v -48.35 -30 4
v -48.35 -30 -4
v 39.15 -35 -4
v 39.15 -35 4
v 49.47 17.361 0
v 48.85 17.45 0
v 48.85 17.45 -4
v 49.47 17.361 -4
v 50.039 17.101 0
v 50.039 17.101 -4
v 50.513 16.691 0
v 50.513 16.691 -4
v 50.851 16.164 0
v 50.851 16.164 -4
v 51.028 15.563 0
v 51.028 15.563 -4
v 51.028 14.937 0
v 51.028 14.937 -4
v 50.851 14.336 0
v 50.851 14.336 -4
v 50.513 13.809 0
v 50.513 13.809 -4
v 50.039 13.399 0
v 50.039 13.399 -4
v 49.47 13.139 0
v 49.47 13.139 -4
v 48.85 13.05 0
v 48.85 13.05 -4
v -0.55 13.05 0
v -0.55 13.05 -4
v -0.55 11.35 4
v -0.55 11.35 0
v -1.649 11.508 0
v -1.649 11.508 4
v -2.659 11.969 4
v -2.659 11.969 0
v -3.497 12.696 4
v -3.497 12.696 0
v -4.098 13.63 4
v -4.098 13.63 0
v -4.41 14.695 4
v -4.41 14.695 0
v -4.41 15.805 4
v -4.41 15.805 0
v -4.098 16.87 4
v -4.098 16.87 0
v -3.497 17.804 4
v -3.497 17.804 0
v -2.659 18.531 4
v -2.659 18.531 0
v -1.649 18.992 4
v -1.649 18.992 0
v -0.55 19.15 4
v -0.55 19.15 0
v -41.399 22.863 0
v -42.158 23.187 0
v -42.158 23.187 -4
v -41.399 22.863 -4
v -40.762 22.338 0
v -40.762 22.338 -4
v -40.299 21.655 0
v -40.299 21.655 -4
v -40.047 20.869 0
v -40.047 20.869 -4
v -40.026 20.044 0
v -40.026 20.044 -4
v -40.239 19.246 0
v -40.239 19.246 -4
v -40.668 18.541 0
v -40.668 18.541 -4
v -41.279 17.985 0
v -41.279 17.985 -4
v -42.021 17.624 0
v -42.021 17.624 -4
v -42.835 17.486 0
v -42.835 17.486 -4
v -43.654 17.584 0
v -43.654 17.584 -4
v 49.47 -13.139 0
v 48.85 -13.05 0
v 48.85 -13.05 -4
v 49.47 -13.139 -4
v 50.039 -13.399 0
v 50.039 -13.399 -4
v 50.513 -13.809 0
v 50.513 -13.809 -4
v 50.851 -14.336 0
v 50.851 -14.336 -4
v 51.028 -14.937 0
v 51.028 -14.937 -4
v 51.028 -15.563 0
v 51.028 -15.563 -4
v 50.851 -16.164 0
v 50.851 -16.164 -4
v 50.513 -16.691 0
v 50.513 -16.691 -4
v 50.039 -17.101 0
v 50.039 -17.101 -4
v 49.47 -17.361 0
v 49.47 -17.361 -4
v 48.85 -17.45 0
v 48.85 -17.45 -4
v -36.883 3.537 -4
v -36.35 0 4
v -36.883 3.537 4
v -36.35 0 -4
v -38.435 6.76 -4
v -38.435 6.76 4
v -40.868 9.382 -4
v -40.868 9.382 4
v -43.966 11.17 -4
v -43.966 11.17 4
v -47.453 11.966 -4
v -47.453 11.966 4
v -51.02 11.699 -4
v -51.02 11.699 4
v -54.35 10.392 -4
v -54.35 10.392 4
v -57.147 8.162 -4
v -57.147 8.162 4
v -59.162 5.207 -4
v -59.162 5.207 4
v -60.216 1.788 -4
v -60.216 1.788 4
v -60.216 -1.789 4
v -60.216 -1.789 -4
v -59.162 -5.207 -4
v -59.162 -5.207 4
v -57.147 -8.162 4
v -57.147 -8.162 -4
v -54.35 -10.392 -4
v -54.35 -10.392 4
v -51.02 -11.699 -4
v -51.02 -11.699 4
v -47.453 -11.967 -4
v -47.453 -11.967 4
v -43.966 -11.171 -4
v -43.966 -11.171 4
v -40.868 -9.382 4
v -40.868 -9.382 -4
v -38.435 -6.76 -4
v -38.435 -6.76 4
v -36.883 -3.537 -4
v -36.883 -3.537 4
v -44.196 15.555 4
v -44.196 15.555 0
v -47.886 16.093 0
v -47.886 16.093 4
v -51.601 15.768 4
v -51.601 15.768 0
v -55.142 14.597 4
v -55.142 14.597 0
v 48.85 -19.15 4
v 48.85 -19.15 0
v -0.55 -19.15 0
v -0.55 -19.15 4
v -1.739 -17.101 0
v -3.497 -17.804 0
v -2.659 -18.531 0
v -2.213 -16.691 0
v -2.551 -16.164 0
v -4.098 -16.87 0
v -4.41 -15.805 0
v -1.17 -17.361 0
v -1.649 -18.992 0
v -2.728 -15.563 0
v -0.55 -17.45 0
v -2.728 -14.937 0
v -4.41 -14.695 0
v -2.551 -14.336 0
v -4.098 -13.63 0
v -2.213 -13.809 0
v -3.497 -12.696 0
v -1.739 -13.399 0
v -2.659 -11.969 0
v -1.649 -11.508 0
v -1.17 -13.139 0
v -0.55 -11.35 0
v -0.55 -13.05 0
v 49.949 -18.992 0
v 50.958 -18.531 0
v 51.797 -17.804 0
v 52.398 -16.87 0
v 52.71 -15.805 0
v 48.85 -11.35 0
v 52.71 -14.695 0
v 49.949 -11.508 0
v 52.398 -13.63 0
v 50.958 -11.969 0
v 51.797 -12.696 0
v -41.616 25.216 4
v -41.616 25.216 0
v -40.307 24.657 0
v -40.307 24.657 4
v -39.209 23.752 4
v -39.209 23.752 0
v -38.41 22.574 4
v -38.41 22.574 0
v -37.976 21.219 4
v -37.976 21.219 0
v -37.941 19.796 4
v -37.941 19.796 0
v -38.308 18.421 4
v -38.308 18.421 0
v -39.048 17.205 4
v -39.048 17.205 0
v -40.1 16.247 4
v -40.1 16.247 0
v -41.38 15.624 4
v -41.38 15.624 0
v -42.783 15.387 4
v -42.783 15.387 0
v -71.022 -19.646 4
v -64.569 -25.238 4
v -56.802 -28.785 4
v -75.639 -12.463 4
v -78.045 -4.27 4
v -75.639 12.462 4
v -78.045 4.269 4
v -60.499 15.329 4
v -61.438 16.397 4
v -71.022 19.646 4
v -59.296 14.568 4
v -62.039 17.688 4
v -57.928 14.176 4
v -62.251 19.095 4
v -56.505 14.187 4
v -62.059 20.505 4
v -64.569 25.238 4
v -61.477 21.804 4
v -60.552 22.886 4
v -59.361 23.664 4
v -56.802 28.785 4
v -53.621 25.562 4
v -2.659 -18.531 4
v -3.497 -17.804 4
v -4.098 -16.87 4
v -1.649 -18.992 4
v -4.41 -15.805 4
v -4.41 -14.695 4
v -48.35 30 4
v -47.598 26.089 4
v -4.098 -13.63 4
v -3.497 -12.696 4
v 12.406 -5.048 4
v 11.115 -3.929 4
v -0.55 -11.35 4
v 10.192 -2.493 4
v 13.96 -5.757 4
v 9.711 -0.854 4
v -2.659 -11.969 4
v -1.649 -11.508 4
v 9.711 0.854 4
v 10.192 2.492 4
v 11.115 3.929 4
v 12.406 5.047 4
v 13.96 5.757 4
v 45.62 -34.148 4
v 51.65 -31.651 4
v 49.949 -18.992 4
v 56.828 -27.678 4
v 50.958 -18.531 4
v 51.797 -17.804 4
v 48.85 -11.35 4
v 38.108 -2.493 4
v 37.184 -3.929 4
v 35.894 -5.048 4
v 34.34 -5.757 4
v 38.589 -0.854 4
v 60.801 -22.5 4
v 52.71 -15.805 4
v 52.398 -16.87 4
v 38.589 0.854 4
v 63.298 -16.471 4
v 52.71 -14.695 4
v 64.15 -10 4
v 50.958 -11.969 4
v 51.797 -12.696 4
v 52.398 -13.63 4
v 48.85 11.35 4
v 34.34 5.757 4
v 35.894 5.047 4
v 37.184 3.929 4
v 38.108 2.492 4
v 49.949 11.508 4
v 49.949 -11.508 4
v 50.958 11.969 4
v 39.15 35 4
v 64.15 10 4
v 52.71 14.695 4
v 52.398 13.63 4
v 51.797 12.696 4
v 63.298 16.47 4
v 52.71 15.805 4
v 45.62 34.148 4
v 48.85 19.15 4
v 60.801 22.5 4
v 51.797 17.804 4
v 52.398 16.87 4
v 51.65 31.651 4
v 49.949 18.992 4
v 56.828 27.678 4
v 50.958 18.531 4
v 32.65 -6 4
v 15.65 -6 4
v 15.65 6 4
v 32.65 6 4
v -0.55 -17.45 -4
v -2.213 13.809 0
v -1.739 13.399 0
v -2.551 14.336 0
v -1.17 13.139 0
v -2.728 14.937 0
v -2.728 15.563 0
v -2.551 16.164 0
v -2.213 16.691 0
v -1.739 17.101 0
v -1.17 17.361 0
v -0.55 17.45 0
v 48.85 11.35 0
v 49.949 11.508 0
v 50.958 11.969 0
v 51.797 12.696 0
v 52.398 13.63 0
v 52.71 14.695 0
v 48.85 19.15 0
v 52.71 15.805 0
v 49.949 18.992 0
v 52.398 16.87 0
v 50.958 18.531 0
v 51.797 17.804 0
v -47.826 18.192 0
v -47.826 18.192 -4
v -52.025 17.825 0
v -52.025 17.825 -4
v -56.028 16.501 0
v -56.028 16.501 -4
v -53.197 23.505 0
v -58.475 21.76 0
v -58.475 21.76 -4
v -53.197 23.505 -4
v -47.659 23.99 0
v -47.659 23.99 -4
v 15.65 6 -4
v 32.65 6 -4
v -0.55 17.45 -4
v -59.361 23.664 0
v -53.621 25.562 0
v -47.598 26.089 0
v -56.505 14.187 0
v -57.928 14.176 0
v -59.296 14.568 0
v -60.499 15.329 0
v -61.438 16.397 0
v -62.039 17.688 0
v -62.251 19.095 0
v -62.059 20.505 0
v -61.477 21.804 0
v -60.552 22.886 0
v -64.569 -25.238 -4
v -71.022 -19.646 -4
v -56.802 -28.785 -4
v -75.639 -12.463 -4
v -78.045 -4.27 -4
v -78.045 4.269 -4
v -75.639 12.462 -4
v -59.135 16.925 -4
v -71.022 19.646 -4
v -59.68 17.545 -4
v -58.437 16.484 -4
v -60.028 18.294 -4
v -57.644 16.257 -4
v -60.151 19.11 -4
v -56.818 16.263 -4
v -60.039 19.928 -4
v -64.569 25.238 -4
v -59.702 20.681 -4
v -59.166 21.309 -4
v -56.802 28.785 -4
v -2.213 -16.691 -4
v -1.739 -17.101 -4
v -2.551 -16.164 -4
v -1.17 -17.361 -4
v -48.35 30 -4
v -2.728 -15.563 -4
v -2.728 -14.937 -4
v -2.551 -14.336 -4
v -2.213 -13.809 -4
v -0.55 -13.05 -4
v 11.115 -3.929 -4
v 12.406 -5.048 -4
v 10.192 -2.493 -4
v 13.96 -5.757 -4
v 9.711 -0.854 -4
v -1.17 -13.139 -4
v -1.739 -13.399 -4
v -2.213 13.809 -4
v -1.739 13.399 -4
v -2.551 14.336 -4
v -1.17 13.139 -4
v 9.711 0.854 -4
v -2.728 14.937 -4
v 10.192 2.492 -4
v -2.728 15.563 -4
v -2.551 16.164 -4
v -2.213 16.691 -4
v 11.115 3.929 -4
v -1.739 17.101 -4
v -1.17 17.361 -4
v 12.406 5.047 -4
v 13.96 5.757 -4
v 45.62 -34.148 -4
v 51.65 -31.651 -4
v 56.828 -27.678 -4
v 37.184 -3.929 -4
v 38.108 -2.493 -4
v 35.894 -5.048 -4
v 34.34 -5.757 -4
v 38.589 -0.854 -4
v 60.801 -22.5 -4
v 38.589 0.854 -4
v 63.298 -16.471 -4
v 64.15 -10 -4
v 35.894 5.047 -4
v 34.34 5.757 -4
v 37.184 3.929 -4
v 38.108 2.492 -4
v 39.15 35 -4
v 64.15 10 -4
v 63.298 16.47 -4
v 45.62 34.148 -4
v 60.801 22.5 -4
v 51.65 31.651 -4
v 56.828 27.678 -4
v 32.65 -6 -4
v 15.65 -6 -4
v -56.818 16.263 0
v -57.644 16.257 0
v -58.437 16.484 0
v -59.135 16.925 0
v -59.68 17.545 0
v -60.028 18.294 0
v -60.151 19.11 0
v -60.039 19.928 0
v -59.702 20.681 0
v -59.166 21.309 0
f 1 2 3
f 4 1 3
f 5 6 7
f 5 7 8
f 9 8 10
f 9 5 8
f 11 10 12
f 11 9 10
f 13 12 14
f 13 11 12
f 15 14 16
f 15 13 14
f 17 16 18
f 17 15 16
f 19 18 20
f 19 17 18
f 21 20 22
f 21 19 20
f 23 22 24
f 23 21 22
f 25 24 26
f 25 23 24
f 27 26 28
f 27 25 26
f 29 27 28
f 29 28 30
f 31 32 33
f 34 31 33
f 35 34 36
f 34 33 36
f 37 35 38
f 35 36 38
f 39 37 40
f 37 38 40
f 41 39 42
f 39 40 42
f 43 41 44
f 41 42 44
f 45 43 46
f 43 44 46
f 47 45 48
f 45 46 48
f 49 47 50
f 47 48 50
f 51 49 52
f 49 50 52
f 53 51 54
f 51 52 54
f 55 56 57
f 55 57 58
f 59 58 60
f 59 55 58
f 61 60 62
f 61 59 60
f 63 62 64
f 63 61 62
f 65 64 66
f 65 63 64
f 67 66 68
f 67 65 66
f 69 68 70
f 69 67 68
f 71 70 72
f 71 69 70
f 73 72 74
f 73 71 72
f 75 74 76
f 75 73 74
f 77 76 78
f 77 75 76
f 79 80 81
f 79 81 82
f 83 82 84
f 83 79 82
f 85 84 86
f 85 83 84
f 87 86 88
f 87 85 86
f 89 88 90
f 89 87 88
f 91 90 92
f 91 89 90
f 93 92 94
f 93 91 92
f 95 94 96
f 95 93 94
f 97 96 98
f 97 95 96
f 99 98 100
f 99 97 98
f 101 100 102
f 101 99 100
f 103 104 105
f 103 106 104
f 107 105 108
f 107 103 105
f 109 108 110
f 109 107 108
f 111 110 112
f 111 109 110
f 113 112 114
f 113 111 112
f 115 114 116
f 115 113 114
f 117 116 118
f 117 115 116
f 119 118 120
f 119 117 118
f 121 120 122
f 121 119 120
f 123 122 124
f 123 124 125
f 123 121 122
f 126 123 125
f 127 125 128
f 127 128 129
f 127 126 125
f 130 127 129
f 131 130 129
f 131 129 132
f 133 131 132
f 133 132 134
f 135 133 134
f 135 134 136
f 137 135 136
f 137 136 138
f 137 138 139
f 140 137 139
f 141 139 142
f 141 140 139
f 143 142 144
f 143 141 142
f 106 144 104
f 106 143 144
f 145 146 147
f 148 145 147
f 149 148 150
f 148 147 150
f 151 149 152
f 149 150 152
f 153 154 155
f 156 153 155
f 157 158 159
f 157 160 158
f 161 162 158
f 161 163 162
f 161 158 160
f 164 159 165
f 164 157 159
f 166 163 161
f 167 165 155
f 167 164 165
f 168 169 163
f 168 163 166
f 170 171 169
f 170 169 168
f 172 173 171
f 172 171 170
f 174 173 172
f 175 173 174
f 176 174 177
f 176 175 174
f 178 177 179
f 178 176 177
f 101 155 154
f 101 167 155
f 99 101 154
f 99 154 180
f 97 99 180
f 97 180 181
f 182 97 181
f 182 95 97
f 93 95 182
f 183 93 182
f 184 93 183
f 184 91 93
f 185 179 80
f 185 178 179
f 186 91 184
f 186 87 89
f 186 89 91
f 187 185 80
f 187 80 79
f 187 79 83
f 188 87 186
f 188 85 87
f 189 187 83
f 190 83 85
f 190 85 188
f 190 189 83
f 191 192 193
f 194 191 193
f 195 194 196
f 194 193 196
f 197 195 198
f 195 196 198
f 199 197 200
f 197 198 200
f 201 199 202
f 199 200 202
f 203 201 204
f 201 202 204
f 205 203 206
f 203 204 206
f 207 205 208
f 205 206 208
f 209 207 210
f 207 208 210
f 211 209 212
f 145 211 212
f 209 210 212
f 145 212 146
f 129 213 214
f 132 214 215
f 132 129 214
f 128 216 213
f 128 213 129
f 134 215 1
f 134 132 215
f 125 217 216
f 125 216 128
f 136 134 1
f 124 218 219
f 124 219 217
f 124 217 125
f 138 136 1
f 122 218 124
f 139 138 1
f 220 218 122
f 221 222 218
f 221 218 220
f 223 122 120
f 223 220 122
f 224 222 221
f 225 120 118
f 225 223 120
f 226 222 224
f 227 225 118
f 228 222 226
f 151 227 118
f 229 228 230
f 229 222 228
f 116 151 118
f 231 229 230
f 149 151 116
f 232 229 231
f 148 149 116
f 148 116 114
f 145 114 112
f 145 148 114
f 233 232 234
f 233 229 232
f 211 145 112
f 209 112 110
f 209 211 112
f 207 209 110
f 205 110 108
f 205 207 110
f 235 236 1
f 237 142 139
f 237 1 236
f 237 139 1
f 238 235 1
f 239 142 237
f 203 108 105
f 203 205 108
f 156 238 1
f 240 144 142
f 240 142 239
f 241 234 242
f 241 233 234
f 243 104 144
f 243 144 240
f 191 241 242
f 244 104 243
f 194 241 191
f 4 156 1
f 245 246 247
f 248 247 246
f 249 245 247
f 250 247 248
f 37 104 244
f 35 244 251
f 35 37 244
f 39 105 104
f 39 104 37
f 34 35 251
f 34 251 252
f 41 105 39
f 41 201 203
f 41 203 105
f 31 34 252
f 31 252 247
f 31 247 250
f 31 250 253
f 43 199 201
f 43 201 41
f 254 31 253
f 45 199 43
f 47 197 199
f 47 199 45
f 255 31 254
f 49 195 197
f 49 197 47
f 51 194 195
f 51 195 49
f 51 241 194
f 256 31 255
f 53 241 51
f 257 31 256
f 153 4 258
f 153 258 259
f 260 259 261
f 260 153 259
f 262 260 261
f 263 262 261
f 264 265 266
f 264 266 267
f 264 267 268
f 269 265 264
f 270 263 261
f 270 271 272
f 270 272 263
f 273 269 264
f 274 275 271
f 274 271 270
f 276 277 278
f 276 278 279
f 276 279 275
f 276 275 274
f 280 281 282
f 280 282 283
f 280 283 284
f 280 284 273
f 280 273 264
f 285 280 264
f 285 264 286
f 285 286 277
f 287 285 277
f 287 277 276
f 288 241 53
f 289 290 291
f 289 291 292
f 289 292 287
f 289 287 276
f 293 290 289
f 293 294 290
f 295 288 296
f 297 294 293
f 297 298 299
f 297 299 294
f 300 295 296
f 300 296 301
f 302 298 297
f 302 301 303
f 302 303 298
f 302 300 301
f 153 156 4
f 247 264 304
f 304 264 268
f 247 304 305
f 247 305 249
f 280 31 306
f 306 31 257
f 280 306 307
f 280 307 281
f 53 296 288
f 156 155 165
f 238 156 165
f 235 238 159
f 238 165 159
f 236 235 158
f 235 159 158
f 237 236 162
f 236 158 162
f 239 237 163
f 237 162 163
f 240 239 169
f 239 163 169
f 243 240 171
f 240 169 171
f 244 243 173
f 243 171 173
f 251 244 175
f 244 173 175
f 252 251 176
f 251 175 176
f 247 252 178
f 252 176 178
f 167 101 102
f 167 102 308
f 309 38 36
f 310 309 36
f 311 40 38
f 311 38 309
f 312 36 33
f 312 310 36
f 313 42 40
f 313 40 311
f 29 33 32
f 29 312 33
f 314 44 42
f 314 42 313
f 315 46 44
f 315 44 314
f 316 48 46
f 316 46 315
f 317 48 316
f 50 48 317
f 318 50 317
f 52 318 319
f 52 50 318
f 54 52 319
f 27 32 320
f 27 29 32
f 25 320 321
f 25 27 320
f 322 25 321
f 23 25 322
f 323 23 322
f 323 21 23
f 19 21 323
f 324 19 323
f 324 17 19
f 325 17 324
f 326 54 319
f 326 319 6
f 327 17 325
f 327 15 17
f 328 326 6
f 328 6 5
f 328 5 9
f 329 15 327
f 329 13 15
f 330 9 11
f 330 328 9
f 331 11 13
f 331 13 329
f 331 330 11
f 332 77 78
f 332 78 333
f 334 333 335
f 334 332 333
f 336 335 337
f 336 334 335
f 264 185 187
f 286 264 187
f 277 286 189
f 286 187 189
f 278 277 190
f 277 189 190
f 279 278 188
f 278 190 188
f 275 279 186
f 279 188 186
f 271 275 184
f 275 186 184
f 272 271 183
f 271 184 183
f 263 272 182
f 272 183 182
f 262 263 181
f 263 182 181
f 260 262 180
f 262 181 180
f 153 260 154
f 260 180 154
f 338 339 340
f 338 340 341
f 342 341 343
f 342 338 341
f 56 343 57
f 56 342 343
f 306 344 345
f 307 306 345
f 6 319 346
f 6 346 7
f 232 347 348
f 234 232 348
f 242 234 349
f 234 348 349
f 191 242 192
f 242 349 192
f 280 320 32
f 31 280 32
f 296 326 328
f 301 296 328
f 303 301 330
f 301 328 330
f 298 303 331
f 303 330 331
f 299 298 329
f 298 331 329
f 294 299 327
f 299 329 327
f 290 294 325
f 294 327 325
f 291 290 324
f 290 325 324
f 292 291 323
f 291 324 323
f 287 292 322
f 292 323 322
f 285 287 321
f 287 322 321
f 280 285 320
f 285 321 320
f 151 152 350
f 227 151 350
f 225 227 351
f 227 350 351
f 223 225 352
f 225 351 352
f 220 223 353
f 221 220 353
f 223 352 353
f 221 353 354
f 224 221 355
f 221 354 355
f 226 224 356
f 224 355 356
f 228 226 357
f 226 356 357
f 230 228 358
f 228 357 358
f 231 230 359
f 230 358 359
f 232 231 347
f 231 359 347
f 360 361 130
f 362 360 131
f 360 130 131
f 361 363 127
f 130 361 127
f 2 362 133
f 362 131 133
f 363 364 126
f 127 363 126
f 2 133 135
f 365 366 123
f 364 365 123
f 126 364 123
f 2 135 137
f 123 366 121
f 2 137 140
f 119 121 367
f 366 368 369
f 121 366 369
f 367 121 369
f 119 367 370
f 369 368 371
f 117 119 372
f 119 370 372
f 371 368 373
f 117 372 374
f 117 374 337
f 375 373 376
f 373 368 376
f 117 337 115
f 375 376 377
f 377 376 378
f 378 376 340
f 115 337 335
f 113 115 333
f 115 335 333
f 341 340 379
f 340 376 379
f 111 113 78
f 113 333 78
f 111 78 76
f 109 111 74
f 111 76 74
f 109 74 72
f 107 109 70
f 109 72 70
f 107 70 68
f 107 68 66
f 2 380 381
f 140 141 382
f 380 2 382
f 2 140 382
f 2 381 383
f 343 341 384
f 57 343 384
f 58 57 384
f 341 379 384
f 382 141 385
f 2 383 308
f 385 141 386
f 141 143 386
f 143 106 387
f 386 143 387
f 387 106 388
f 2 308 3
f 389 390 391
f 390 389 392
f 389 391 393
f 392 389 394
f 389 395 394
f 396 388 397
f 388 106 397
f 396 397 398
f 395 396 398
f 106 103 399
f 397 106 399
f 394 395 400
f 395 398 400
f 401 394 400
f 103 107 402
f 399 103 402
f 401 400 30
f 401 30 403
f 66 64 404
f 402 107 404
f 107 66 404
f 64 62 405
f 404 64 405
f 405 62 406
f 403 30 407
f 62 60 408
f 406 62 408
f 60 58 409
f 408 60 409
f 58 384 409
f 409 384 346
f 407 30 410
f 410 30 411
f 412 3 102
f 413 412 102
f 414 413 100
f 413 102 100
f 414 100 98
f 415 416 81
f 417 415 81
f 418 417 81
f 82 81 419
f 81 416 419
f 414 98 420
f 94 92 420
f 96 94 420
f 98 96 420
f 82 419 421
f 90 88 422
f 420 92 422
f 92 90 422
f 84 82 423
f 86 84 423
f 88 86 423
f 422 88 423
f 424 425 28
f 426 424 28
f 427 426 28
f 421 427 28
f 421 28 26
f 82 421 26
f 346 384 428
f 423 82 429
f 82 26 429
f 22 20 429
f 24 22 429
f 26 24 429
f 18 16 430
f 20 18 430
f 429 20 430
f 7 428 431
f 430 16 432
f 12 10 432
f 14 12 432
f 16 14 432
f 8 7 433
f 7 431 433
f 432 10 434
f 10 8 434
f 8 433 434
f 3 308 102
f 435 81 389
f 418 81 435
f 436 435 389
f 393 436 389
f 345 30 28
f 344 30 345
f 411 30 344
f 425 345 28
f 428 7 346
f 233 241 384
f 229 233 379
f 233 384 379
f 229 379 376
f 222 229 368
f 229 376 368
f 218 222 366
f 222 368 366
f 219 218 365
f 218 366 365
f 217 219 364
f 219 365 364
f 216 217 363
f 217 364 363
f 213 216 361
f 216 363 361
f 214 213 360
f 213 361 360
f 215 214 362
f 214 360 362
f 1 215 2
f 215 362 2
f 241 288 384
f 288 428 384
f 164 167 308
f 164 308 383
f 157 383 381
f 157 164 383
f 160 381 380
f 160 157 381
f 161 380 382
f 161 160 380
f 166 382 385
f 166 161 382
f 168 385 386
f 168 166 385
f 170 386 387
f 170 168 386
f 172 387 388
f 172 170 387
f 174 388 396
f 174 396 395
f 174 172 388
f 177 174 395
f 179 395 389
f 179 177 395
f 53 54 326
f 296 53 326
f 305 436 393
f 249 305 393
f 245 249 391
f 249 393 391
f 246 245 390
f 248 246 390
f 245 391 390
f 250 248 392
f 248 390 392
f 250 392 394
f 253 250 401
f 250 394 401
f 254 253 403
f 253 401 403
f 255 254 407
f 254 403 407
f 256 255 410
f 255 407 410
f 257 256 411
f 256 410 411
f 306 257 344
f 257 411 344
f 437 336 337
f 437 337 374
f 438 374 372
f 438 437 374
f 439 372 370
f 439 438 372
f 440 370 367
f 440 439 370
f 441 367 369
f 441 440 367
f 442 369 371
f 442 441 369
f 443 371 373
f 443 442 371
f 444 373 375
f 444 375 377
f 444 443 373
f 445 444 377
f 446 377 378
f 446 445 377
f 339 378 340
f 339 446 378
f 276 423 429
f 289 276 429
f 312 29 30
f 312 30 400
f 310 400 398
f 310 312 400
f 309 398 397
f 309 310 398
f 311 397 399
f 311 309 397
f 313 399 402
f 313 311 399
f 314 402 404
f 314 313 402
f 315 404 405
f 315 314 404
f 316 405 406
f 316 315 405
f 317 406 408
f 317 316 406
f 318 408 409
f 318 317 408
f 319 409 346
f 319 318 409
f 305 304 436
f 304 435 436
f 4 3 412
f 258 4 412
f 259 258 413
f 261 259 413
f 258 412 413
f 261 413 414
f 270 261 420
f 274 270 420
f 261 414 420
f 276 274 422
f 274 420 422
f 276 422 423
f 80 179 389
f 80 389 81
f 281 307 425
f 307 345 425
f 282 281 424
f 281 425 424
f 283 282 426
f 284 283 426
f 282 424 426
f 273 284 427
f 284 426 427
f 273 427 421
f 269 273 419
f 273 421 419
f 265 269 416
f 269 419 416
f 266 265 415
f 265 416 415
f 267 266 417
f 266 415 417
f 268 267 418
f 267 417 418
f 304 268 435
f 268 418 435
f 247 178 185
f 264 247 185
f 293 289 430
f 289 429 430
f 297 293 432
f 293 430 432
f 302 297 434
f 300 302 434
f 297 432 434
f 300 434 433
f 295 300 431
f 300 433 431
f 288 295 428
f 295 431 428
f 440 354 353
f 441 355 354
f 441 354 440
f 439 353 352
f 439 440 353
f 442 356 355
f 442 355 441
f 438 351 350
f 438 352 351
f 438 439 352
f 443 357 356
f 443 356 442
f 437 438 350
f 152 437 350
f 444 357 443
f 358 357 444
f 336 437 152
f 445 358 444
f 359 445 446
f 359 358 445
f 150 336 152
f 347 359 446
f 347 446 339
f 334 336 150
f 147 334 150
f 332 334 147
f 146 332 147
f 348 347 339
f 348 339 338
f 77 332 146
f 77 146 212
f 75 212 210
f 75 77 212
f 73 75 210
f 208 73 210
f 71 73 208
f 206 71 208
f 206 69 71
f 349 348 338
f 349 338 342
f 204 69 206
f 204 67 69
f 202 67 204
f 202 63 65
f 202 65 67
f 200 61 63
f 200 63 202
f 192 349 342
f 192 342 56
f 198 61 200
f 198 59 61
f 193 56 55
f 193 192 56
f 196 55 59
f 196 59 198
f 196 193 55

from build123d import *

# Parameters (mm, degrees)
F0_R     = 12
F1_DEPTH = 4
F2_DEPTH = 4


# Not quite as in the source:
# - a feature names something its author has since deleted; it is built from what else it names


with BuildPart() as f1:
    # F0 (on Top) → F1 (new body)
    with BuildSketch(Plane.XY):
        with BuildLine():
            Line((64.1499952853, -10.0000936452), (64.1499952853, 9.9999063548))
            ThreePointArc((64.1499952853, 9.9999063548), (56.8276648149, 27.6775758844), (39.1499952853, 34.9999063548))
            Line((39.1499952853, 34.9999063548), (-48.3500047147, 29.9999063548))
            ThreePointArc((-48.3500047147, 29.9999063548), (-78.3500047147, -9.36452e-05), (-48.3500047147, -30.0000936452))
            Line((-48.3500047147, -30.0000936452), (39.1499952853, -35.0000936452))
            ThreePointArc((39.1499952853, -35.0000936452), (56.8276648149, -27.6777631749), (64.1499952853, -10.0000936452))
        make_face()
        with BuildLine():
            ThreePointArc((-0.5500047147, -19.1500936452), (-4.4500047147, -15.2500936452), (-0.5500047147, -11.3500936452))
            Line((-0.5500047147, -11.3500936452), (24.1499952853, -11.3500936452))
            Line((24.1499952853, -11.3500936452), (48.8499952853, -11.3500936452))
            ThreePointArc((48.8499952853, -11.3500936452), (52.7499952853, -15.2500936452), (48.8499952853, -19.1500936452))
            Line((48.8499952853, -19.1500936452), (24.1499952853, -19.1500936452))
            Line((24.1499952853, -19.1500936452), (-0.5500047147, -19.1500936452))
        make_face(mode=Mode.SUBTRACT)
        with Locations((-48.3500047147, -9.36452e-05)):
            Circle(F0_R, mode=Mode.SUBTRACT)
        with BuildLine():
            ThreePointArc((-55.1419234399, 14.5971608922), (-61.784523832, 17.0211782252), (-59.3605064989, 23.6637786173))
            ThreePointArc((-59.3605064989, 23.6637786173), (-50.6247696004, 26.0005879749), (-41.615965488, 25.2162247953))
            ThreePointArc((-41.615965488, 25.2162247953), (-38.075298972, 19.0954666215), (-44.1960571458, 15.5548001054))
            ThreePointArc((-44.1960571458, 15.5548001054), (-49.753212173, 16.038640994), (-55.1419234399, 14.5971608922))
        make_face(mode=Mode.SUBTRACT)
        with BuildLine():
            Line((24.1499952853, 5.9999063548), (32.6499952853, 5.9999063548))
            ThreePointArc((32.6499952853, 5.9999063548), (38.6499952853, -9.36452e-05), (32.6499952853, -6.0000936452))
            Line((32.6499952853, -6.0000936452), (24.1499952853, -6.0000936452))
            Line((24.1499952853, -6.0000936452), (15.6499952853, -6.0000936452))
            ThreePointArc((15.6499952853, -6.0000936452), (9.6499952853, -9.36452e-05), (15.6499952853, 5.9999063548))
            Line((15.6499952853, 5.9999063548), (24.1499952853, 5.9999063548))
        make_face(mode=Mode.SUBTRACT)
        with BuildLine():
            Line((24.1499952853, 11.3499063548), (-0.5500047147, 11.3499063548))
            ThreePointArc((-0.5500047147, 11.3499063548), (-4.4500047147, 15.2499063548), (-0.5500047147, 19.1499063548))
            Line((-0.5500047147, 19.1499063548), (24.1499952853, 19.1499063548))
            Line((24.1499952853, 19.1499063548), (48.8499952853, 19.1499063548))
            ThreePointArc((48.8499952853, 19.1499063548), (52.7499952853, 15.2499063548), (48.8499952853, 11.3499063548))
            Line((48.8499952853, 11.3499063548), (24.1499952853, 11.3499063548))
        make_face(mode=Mode.SUBTRACT)
        with BuildLine():
            ThreePointArc((-41.615965488, 25.2162247953), (-50.6247696004, 26.0005879749), (-59.3605064989, 23.6637786173))
            ThreePointArc((-59.3605064989, 23.6637786173), (-61.784523832, 17.0211782252), (-55.1419234399, 14.5971608922))
            ThreePointArc((-55.1419234399, 14.5971608922), (-49.753212173, 16.038640994), (-44.1960571458, 15.5548001054))
            ThreePointArc((-44.1960571458, 15.5548001054), (-38.075298972, 19.0954666215), (-41.615965488, 25.2162247953))
        make_face()
        with BuildLine():
            ThreePointArc((-56.0278258823, 16.5011506145), (-59.8805341097, 17.9070806676), (-58.4746040565, 21.7597888951))
            ThreePointArc((-58.4746040565, 21.7597888951), (-50.4417425407, 23.908579109), (-42.1577847361, 23.1873256104))
            ThreePointArc((-42.1577847361, 23.1873256104), (-40.1041981568, 19.6372858696), (-43.6542378976, 17.5836992903))
            ThreePointArc((-43.6542378976, 17.5836992903), (-49.9362392327, 18.13064986), (-56.0278258823, 16.5011506145))
        make_face(mode=Mode.SUBTRACT)
        with BuildLine():
            ThreePointArc((-0.5500047147, 19.1499063548), (-4.4500047147, 15.2499063548), (-0.5500047147, 11.3499063548))
            Line((-0.5500047147, 11.3499063548), (24.1499952853, 11.3499063548))
            Line((24.1499952853, 11.3499063548), (48.8499952853, 11.3499063548))
            ThreePointArc((48.8499952853, 11.3499063548), (52.7499952853, 15.2499063548), (48.8499952853, 19.1499063548))
            Line((48.8499952853, 19.1499063548), (24.1499952853, 19.1499063548))
            Line((24.1499952853, 19.1499063548), (-0.5500047147, 19.1499063548))
        make_face()
        with BuildLine():
            Line((24.1499952853, 13.0499063548), (-0.5500047147, 13.0499063548))
            ThreePointArc((-0.5500047147, 13.0499063548), (-2.7500047147, 15.2499063548), (-0.5500047147, 17.4499063548))
            Line((-0.5500047147, 17.4499063548), (24.1499952853, 17.4499063548))
            Line((24.1499952853, 17.4499063548), (48.8499952853, 17.4499063548))
            ThreePointArc((48.8499952853, 17.4499063548), (51.0499952853, 15.2499063548), (48.8499952853, 13.0499063548))
            Line((48.8499952853, 13.0499063548), (24.1499952853, 13.0499063548))
        make_face(mode=Mode.SUBTRACT)
        with BuildLine():
            Line((24.1499952853, -11.3500936452), (-0.5500047147, -11.3500936452))
            ThreePointArc((-0.5500047147, -11.3500936452), (-4.4500047147, -15.2500936452), (-0.5500047147, -19.1500936452))
            Line((-0.5500047147, -19.1500936452), (24.1499952853, -19.1500936452))
            Line((24.1499952853, -19.1500936452), (48.8499952853, -19.1500936452))
            ThreePointArc((48.8499952853, -19.1500936452), (52.7499952853, -15.2500936452), (48.8499952853, -11.3500936452))
            Line((48.8499952853, -11.3500936452), (24.1499952853, -11.3500936452))
        make_face()
        with BuildLine():
            ThreePointArc((-0.5500047147, -17.4500936452), (-2.7500047147, -15.2500936452), (-0.5500047147, -13.0500936452))
            Line((-0.5500047147, -13.0500936452), (24.1499952853, -13.0500936452))
            Line((24.1499952853, -13.0500936452), (48.8499952853, -13.0500936452))
            ThreePointArc((48.8499952853, -13.0500936452), (51.0499952853, -15.2500936452), (48.8499952853, -17.4500936452))
            Line((48.8499952853, -17.4500936452), (24.1499952853, -17.4500936452))
            Line((24.1499952853, -17.4500936452), (-0.5500047147, -17.4500936452))
        make_face(mode=Mode.SUBTRACT)
    extrude(amount=-F1_DEPTH)

    # F0 (on Top) → F2 (join)
    with BuildSketch(Plane.XY):
        with BuildLine():
            Line((64.1499952853, -10.0000936452), (64.1499952853, 9.9999063548))
            ThreePointArc((64.1499952853, 9.9999063548), (56.8276648149, 27.6775758844), (39.1499952853, 34.9999063548))
            Line((39.1499952853, 34.9999063548), (-48.3500047147, 29.9999063548))
            ThreePointArc((-48.3500047147, 29.9999063548), (-78.3500047147, -9.36452e-05), (-48.3500047147, -30.0000936452))
            Line((-48.3500047147, -30.0000936452), (39.1499952853, -35.0000936452))
            ThreePointArc((39.1499952853, -35.0000936452), (56.8276648149, -27.6777631749), (64.1499952853, -10.0000936452))
        make_face()
        with BuildLine():
            ThreePointArc((-0.5500047147, -19.1500936452), (-4.4500047147, -15.2500936452), (-0.5500047147, -11.3500936452))
            Line((-0.5500047147, -11.3500936452), (24.1499952853, -11.3500936452))
            Line((24.1499952853, -11.3500936452), (48.8499952853, -11.3500936452))
            ThreePointArc((48.8499952853, -11.3500936452), (52.7499952853, -15.2500936452), (48.8499952853, -19.1500936452))
            Line((48.8499952853, -19.1500936452), (24.1499952853, -19.1500936452))
            Line((24.1499952853, -19.1500936452), (-0.5500047147, -19.1500936452))
        make_face(mode=Mode.SUBTRACT)
        with Locations((-48.3500047147, -9.36452e-05)):
            Circle(F0_R, mode=Mode.SUBTRACT)
        with BuildLine():
            ThreePointArc((-55.1419234399, 14.5971608922), (-61.784523832, 17.0211782252), (-59.3605064989, 23.6637786173))
            ThreePointArc((-59.3605064989, 23.6637786173), (-50.6247696004, 26.0005879749), (-41.615965488, 25.2162247953))
            ThreePointArc((-41.615965488, 25.2162247953), (-38.075298972, 19.0954666215), (-44.1960571458, 15.5548001054))
            ThreePointArc((-44.1960571458, 15.5548001054), (-49.753212173, 16.038640994), (-55.1419234399, 14.5971608922))
        make_face(mode=Mode.SUBTRACT)
        with BuildLine():
            Line((24.1499952853, 5.9999063548), (32.6499952853, 5.9999063548))
            ThreePointArc((32.6499952853, 5.9999063548), (38.6499952853, -9.36452e-05), (32.6499952853, -6.0000936452))
            Line((32.6499952853, -6.0000936452), (24.1499952853, -6.0000936452))
            Line((24.1499952853, -6.0000936452), (15.6499952853, -6.0000936452))
            ThreePointArc((15.6499952853, -6.0000936452), (9.6499952853, -9.36452e-05), (15.6499952853, 5.9999063548))
            Line((15.6499952853, 5.9999063548), (24.1499952853, 5.9999063548))
        make_face(mode=Mode.SUBTRACT)
        with BuildLine():
            Line((24.1499952853, 11.3499063548), (-0.5500047147, 11.3499063548))
            ThreePointArc((-0.5500047147, 11.3499063548), (-4.4500047147, 15.2499063548), (-0.5500047147, 19.1499063548))
            Line((-0.5500047147, 19.1499063548), (24.1499952853, 19.1499063548))
            Line((24.1499952853, 19.1499063548), (48.8499952853, 19.1499063548))
            ThreePointArc((48.8499952853, 19.1499063548), (52.7499952853, 15.2499063548), (48.8499952853, 11.3499063548))
            Line((48.8499952853, 11.3499063548), (24.1499952853, 11.3499063548))
        make_face(mode=Mode.SUBTRACT)
    extrude(amount=F2_DEPTH)


solid = f1.part
